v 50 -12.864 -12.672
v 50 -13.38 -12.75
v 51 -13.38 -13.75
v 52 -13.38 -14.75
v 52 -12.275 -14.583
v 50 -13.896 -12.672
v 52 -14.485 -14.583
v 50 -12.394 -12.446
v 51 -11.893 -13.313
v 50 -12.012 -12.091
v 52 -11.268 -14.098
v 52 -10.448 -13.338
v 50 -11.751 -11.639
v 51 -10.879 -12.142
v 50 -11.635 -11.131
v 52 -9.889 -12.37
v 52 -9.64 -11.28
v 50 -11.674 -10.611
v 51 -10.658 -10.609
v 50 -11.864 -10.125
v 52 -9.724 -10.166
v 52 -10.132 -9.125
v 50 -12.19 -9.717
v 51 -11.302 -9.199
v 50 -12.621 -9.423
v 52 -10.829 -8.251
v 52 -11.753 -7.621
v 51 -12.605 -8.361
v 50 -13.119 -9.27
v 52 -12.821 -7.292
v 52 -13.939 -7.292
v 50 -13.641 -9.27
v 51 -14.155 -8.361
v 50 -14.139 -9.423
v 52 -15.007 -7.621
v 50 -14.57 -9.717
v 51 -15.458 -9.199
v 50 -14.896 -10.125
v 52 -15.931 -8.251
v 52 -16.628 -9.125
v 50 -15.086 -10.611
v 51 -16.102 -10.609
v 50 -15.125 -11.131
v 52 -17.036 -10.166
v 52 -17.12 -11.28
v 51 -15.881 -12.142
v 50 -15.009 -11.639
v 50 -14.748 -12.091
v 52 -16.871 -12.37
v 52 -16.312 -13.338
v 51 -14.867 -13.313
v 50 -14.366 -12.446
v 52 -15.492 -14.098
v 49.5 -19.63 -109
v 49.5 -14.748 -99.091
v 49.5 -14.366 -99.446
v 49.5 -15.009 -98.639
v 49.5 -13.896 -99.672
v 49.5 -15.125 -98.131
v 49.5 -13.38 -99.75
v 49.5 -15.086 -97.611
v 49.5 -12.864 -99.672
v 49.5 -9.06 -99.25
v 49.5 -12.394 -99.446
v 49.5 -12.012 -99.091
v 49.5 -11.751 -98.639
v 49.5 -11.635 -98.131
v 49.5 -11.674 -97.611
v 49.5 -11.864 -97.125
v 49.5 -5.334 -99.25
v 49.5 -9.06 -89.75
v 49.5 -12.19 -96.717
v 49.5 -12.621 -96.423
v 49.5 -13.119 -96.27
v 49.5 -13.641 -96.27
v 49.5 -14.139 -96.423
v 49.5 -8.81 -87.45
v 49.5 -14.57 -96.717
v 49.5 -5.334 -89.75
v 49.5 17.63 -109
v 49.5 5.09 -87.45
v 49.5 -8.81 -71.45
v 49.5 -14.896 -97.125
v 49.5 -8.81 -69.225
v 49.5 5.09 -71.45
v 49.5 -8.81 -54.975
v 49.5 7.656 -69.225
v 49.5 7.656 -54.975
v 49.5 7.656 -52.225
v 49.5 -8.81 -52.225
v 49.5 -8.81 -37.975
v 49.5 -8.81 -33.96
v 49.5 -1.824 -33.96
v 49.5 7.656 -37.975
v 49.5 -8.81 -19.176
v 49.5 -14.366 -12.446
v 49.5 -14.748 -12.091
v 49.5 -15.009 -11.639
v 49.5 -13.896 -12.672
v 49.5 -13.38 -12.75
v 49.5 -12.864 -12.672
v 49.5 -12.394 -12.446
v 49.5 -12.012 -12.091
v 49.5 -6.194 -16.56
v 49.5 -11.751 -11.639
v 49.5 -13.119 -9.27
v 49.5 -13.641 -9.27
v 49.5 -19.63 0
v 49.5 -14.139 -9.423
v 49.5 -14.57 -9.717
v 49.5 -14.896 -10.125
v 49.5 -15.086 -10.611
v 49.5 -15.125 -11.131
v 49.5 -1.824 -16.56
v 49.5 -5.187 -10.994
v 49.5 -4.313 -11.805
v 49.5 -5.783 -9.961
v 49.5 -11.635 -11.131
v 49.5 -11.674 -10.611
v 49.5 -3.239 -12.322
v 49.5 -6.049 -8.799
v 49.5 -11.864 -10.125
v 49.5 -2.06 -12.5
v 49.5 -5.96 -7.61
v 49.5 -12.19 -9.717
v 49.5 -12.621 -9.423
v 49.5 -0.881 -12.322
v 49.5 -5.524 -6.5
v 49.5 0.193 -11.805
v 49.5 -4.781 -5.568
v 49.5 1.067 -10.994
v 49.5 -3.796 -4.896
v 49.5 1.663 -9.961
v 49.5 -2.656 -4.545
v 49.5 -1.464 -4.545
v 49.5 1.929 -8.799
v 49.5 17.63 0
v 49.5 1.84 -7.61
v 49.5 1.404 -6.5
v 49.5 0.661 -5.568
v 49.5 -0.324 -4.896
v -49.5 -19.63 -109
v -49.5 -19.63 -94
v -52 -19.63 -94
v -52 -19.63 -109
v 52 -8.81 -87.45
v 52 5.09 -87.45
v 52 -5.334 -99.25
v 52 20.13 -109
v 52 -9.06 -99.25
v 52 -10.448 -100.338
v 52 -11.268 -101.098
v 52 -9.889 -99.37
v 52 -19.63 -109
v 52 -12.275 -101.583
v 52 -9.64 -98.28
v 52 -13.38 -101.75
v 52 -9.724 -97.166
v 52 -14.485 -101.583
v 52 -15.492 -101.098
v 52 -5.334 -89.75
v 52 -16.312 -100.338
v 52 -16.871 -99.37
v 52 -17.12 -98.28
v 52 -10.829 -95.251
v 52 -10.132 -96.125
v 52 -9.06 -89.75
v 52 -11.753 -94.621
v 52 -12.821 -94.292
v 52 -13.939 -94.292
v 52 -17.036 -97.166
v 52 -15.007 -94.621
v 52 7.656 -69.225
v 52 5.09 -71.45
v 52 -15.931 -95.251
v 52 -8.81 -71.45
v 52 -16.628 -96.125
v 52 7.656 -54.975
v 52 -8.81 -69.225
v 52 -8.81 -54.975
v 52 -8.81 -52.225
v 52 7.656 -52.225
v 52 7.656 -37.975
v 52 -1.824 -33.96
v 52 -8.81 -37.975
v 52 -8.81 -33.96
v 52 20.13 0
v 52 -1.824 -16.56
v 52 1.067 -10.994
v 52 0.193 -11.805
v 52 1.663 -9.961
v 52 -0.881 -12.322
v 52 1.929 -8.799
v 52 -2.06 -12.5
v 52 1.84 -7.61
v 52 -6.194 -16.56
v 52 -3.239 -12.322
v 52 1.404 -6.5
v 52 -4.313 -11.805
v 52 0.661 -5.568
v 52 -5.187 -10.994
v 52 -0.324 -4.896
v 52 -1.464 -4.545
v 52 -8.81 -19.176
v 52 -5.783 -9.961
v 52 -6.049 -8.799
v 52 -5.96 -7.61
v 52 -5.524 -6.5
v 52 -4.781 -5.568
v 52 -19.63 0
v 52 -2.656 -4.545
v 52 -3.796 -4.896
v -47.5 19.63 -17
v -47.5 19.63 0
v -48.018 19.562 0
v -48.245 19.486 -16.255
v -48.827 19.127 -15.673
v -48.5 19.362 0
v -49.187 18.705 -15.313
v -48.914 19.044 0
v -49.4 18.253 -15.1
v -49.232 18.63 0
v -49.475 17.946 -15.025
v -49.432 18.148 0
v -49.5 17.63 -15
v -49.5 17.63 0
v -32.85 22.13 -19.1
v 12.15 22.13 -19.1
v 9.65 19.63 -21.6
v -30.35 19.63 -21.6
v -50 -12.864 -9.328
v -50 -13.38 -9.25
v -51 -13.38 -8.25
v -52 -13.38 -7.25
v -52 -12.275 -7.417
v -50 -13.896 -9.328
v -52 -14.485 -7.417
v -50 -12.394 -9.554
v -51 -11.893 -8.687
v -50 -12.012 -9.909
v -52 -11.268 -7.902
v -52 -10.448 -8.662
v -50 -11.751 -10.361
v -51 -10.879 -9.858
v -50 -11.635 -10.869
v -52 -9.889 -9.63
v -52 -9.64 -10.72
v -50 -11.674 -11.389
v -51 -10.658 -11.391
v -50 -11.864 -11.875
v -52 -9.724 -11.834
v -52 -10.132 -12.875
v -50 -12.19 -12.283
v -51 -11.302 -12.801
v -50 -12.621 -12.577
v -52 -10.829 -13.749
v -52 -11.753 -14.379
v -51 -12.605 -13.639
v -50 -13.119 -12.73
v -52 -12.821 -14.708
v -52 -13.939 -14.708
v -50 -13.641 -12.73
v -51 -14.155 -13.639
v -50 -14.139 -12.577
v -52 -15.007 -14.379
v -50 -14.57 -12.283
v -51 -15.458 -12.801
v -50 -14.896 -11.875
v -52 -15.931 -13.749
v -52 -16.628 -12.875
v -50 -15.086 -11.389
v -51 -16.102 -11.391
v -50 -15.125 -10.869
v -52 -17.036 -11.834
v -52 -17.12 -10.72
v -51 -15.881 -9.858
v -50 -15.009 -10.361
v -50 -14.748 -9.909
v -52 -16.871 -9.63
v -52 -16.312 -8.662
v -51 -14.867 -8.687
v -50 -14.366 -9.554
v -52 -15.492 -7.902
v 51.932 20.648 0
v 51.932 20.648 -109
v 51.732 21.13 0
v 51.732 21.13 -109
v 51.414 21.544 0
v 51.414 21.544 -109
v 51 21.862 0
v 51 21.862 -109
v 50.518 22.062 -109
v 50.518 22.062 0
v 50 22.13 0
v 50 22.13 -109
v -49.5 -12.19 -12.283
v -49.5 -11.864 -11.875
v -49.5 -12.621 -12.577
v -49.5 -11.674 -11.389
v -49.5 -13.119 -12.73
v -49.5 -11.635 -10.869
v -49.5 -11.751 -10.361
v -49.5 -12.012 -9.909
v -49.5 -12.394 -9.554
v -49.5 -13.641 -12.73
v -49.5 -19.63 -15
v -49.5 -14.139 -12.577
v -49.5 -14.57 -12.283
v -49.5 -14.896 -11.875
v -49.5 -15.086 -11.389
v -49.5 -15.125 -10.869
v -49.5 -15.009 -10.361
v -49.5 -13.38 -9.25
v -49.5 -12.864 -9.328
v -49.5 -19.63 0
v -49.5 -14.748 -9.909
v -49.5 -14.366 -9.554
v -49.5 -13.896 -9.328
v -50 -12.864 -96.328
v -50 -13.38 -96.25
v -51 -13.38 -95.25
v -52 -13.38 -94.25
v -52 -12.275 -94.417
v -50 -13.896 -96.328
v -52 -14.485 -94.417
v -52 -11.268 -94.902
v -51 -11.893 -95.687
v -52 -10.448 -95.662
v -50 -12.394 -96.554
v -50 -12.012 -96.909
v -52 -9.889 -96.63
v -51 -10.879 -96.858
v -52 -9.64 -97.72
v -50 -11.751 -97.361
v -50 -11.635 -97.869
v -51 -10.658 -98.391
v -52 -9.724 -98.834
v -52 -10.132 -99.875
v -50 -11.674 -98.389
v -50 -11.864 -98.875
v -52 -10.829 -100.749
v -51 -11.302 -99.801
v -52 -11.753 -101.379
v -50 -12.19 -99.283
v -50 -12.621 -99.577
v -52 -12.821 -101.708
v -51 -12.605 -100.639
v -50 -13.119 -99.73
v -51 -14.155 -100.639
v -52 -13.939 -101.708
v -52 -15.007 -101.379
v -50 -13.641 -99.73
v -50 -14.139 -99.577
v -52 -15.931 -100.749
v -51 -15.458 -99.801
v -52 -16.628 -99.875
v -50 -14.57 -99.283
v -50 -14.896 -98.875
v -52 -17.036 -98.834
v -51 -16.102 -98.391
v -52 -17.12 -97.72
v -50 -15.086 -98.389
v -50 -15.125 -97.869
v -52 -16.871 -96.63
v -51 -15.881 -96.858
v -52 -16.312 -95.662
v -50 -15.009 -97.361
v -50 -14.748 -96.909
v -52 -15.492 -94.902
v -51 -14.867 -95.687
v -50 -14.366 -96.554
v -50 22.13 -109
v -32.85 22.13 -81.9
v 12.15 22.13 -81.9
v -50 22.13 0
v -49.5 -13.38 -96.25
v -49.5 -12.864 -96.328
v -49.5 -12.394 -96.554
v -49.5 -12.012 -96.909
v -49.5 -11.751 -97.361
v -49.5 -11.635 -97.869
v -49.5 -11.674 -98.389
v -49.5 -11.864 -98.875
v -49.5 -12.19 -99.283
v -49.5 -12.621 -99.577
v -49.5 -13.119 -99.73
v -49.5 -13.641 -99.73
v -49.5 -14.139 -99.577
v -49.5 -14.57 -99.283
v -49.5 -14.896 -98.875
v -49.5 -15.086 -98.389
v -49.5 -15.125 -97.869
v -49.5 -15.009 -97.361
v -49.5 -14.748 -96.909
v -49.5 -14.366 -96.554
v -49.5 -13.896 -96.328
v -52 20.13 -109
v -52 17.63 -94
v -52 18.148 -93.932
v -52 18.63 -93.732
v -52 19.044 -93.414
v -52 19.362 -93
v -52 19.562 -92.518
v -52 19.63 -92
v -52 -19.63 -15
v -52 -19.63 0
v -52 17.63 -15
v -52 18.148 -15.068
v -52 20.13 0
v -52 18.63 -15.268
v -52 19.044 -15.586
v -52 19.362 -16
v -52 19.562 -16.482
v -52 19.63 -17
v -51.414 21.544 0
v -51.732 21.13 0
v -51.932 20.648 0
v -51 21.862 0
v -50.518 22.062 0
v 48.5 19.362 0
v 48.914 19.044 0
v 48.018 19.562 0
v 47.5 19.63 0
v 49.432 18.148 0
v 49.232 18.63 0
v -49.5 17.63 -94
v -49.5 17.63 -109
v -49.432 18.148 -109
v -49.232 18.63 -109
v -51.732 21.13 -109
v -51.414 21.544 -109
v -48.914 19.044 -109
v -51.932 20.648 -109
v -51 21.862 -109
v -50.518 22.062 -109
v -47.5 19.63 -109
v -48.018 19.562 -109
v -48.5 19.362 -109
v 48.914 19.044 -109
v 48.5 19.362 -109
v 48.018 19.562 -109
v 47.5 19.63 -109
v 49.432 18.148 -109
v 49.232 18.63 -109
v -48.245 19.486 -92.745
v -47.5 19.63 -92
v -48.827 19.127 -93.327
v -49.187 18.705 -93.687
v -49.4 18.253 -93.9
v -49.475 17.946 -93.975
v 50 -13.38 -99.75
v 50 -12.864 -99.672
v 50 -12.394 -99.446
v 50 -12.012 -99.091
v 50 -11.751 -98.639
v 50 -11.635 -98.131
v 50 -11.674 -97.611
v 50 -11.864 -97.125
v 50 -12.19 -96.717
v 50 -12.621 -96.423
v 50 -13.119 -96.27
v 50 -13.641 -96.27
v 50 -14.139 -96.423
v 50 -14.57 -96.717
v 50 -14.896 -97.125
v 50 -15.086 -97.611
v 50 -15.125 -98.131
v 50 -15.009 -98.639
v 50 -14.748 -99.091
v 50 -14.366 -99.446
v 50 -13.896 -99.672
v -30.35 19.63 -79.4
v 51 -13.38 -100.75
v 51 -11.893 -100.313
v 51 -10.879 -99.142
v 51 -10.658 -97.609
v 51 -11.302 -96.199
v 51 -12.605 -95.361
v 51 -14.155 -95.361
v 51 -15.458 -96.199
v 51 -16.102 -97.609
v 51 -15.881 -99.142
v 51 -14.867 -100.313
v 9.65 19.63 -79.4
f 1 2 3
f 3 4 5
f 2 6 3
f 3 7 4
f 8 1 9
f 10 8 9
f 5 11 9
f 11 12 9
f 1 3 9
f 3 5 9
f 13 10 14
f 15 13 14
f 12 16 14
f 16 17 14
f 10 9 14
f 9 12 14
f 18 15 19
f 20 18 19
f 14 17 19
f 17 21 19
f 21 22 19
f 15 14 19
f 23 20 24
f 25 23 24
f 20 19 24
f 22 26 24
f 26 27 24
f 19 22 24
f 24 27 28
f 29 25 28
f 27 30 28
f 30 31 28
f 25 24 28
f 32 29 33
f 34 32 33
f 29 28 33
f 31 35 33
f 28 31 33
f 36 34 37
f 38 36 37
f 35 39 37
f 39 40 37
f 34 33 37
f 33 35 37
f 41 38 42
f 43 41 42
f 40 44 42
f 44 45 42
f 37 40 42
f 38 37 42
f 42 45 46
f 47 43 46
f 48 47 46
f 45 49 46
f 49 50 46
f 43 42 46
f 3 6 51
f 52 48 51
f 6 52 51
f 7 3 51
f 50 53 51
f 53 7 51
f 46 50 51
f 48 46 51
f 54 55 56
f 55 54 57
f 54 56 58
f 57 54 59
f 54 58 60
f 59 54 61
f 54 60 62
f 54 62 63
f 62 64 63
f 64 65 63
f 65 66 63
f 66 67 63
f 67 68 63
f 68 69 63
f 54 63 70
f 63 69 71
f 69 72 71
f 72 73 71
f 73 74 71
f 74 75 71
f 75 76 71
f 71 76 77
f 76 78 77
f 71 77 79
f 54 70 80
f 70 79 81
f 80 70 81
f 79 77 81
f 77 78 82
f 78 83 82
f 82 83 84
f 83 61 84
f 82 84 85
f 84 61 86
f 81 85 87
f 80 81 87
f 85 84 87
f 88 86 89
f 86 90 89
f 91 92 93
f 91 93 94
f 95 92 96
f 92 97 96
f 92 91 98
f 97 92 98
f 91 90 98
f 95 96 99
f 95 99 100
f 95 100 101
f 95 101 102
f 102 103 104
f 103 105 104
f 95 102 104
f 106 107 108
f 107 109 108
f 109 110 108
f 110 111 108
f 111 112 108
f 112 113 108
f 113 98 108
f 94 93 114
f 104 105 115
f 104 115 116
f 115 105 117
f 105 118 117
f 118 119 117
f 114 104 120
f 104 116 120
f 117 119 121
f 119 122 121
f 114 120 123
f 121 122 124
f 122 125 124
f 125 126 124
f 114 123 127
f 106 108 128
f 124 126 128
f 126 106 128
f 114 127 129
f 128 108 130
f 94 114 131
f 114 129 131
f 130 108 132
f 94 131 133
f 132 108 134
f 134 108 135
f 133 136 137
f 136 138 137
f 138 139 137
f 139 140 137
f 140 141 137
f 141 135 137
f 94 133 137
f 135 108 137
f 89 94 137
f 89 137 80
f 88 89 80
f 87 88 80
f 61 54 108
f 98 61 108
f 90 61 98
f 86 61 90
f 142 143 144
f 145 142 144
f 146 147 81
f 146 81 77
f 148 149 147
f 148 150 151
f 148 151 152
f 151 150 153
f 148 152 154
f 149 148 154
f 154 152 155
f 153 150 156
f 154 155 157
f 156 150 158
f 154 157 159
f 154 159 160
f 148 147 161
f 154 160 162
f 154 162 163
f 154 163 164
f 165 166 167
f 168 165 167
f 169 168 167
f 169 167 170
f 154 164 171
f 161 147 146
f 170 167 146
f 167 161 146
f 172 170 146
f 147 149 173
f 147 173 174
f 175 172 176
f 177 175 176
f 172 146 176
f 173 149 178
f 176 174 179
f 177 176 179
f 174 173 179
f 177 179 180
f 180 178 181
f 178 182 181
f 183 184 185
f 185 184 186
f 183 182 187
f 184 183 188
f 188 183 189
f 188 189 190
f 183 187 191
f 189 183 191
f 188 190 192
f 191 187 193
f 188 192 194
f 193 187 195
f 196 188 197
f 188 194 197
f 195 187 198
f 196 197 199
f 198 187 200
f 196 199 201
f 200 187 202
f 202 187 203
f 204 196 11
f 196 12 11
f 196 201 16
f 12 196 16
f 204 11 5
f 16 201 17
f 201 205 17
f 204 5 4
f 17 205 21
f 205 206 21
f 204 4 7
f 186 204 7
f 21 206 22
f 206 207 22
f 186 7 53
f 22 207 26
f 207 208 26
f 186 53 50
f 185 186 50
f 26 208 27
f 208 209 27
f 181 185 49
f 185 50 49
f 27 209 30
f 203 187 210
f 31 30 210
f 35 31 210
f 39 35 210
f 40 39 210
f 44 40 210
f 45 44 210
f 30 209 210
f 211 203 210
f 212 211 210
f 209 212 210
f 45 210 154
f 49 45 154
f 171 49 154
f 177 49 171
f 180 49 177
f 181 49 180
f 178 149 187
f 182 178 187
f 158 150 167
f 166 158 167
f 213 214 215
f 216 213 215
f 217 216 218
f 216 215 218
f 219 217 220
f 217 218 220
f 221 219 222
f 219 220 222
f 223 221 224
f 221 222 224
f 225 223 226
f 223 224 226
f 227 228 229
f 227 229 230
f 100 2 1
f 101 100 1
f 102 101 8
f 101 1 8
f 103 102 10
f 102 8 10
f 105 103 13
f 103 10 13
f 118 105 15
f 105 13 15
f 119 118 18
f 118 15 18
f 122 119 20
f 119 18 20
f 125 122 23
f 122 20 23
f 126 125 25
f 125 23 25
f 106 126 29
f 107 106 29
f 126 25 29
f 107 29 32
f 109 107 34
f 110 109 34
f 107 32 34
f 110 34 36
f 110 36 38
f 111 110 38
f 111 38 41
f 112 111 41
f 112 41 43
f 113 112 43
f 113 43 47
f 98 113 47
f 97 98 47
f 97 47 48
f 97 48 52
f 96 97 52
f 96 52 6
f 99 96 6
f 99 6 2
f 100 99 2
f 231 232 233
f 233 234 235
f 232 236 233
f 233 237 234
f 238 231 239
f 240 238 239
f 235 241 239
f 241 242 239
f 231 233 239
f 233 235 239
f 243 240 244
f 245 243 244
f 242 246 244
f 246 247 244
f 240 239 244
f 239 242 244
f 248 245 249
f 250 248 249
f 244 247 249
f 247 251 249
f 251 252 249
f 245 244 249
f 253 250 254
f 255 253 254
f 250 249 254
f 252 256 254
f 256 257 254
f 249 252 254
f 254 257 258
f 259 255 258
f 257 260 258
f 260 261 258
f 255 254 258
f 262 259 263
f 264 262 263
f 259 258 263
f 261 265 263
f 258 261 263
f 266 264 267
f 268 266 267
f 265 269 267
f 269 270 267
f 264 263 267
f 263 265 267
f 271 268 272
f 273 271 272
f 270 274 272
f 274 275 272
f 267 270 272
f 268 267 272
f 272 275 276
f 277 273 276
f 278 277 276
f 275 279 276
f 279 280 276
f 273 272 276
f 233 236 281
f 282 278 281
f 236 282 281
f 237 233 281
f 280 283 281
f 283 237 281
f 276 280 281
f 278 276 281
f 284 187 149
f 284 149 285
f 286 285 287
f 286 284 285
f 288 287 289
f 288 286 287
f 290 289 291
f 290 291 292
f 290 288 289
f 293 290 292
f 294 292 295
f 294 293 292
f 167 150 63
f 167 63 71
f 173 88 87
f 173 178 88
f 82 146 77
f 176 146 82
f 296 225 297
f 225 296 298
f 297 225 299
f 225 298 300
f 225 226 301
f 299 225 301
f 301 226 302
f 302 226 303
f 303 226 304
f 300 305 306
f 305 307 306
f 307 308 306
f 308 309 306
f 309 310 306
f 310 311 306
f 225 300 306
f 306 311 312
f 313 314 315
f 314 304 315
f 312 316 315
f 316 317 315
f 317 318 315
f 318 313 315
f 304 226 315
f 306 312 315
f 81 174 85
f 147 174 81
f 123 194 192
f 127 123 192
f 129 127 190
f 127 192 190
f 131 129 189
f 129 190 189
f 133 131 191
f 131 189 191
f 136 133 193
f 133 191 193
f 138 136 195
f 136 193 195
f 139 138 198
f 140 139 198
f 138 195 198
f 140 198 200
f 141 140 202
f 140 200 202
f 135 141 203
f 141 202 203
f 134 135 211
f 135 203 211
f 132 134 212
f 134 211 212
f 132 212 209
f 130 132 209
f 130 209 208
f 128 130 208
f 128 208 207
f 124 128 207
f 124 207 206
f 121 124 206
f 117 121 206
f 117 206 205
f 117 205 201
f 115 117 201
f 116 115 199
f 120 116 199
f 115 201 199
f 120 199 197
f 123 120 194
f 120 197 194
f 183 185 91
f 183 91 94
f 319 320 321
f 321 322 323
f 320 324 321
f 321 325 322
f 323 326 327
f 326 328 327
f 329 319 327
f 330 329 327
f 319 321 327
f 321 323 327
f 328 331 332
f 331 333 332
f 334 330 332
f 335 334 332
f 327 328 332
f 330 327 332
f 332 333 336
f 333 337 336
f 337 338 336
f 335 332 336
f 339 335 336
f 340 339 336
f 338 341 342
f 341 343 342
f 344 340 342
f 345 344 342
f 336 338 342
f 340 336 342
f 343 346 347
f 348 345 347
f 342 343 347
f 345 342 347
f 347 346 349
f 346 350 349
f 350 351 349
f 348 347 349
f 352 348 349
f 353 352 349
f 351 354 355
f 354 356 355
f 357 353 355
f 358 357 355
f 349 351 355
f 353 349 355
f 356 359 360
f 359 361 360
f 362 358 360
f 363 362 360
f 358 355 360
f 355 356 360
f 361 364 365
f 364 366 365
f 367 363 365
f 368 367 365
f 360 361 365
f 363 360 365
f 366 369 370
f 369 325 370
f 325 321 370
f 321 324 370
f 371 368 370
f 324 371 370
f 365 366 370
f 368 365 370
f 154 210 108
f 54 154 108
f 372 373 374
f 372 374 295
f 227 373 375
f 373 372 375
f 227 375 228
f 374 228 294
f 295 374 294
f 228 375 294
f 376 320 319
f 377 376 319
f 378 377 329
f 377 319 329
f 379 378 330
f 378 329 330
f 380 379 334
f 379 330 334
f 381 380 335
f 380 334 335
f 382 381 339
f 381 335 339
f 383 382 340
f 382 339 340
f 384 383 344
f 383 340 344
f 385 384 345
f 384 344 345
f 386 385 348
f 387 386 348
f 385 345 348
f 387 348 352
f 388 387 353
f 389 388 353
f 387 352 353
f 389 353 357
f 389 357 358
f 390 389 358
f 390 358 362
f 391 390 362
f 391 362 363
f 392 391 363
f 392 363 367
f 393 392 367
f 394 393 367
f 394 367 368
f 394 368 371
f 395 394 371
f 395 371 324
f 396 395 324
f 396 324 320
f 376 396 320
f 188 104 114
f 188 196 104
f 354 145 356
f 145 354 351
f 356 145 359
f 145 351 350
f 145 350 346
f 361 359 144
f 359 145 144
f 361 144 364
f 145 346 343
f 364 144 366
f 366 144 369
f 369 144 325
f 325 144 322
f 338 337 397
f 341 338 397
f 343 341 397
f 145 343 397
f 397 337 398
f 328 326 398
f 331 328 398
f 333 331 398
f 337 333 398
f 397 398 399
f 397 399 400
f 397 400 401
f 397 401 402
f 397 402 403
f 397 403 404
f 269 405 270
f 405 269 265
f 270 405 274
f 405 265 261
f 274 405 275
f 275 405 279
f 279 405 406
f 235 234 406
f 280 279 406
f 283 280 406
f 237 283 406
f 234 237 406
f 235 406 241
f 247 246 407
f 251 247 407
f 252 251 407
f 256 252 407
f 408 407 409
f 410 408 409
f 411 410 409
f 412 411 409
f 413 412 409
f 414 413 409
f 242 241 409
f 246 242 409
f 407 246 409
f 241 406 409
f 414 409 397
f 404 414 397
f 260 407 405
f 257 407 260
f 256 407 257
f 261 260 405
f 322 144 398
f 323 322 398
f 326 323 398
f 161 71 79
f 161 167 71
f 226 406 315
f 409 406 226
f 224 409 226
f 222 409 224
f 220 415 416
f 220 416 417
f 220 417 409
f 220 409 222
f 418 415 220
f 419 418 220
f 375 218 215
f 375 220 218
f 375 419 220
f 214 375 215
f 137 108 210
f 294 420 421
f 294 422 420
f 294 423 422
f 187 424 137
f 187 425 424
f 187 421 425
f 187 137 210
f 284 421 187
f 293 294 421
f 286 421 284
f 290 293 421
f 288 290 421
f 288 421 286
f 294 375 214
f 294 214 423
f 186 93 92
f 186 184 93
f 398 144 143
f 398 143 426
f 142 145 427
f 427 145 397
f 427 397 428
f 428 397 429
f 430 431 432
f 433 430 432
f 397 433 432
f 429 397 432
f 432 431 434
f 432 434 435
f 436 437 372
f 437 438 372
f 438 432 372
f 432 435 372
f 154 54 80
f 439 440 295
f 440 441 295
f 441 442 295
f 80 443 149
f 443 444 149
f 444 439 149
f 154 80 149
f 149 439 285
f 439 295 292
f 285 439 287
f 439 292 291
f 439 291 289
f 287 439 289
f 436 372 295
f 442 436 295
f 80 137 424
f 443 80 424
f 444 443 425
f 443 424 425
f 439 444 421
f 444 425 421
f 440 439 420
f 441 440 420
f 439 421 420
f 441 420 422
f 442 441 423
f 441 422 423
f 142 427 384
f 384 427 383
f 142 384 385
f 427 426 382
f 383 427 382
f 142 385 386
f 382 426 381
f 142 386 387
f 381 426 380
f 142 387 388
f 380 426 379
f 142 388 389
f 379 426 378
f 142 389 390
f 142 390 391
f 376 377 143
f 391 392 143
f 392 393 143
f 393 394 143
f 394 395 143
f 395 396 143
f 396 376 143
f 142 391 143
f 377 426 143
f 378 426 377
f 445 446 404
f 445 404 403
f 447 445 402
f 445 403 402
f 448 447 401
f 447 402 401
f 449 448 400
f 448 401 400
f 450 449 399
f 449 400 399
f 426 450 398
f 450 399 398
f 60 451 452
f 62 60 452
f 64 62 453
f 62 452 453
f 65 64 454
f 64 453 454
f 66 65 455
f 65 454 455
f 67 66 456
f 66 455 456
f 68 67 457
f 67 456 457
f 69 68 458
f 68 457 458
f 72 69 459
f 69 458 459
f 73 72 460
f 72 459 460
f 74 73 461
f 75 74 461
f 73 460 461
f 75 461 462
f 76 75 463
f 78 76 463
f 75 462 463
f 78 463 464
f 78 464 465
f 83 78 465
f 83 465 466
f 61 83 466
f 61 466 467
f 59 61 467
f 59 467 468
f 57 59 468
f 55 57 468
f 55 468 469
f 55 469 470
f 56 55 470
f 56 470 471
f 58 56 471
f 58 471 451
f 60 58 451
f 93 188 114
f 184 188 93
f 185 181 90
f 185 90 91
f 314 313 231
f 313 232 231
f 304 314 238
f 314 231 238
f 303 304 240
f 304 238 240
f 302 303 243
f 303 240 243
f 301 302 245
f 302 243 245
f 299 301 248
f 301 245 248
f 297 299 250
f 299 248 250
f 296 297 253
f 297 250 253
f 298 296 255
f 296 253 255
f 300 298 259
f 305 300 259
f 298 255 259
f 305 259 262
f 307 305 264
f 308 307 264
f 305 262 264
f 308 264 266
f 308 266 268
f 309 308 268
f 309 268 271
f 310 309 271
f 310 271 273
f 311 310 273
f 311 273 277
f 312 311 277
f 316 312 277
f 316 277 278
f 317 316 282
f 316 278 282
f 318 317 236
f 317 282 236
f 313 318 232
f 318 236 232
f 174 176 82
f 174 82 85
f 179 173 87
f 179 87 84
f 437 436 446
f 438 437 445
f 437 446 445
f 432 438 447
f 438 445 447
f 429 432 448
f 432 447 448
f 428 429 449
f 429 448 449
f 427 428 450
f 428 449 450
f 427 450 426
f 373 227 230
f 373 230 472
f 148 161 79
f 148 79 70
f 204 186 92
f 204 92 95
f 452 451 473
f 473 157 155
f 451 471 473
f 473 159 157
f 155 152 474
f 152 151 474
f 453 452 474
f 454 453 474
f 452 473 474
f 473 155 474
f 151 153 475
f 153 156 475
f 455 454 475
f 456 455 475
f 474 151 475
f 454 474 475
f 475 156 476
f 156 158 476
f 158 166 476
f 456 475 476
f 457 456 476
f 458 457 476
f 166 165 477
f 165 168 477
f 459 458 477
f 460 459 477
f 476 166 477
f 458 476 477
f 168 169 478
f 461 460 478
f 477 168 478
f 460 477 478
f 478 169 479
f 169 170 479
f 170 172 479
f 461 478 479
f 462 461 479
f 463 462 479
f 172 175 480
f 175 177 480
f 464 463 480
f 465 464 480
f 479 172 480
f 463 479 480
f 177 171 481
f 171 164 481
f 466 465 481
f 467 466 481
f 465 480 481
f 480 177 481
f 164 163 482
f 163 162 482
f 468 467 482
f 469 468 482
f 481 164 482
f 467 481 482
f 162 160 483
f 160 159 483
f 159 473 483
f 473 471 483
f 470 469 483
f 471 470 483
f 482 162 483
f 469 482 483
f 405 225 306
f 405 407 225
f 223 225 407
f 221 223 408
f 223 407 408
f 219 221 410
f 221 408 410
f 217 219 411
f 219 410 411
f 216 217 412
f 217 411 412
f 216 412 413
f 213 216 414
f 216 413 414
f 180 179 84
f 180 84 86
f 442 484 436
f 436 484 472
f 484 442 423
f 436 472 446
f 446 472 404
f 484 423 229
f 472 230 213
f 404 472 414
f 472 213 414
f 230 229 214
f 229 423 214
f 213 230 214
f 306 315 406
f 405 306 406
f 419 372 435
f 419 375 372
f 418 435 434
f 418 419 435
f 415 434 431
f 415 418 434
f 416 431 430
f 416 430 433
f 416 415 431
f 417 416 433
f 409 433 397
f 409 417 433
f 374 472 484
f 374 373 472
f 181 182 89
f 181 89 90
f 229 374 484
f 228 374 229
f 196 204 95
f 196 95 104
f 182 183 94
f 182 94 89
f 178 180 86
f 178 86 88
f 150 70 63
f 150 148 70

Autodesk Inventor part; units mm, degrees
ref_plane "YZ Plane" through (0, 0, 0) normal (1, 0, 0) x (0, 1, 0)
sketch "Sketch1" plane through (0, 0, 0) normal (0, 0, 1) x (1, 0, 0)
  line L0 (47.5, 19.63) -> (-47.5, 19.63) projected
  arc A0 (-47.5, 19.63) -> (-49.5, 17.63) centre (-47.5, 17.63) ccw projected
  line L1 (-49.5, 17.63) -> (-49.5, -19.63) projected
  line L2 (49.5, -19.63) -> (49.5, 17.63) projected
  arc A1 (49.5, 17.63) -> (47.5, 19.63) centre (47.5, 17.63) ccw projected
  line L3 (-49.5, -19.63) -> (-52, -19.63)
  line L4 (-52, -19.63) -> (-52, 20.13)
  line L5 (-50, 22.13) -> (50, 22.13)
  line L6 (52, 20.13) -> (52, -19.63)
  line L7 (52, -19.63) -> (49.5, -19.63)
  arc A2 (-50, 22.13) -> (-52, 20.13) centre (-50, 20.13) ccw
  arc A3 (52, 20.13) -> (50, 22.13) centre (50, 20.13) ccw
  dimension "d0" = 2.5
  dimension "d1" = 2.5
  dimension "d2" = 2.5
  dimension "d3" = 2
ref_plane "Work Plane1" through (-49.5, -19.63, -109) normal (0, 0, -1) x (0, 1, 0)
extrude "Extrusion1" add sketch "Sketch1" against normal up to surface (109 mm away)
sketch "Sketch2" plane through (-50, 22.13, 0) normal (0, 1, 0) x (1, 0, 0)
  circle A0 centre (39.65, 50.5) radius 18.5 construction
  line L0 (58.85, 79.4) -> (20.45, 79.4) construction
  line L1 (20.45, 79.4) -> (20.45, 21.6) construction
  line L2 (58.85, 21.6) -> (58.85, 79.4) construction
  line L3 (20.45, 21.6) -> (58.85, 21.6) construction
  line L4 (20.15, 23.6) -> (20.15, 77.4) construction
  line L5 (59.15, 77.4) -> (59.15, 23.6) construction
  line L6 (20.15, 21.6) -> (59.15, 21.6) construction
  line L7 (59.15, 79.4) -> (20.15, 79.4) construction
  line L8 (20.15, 21.6) -> (59.15, 21.6)
  line L9 (59.15, 21.6) -> (59.15, 79.4)
  line L10 (59.15, 79.4) -> (20.15, 79.4)
  line L11 (20.15, 79.4) -> (20.15, 21.6)
  line L12 (59.65, 79.4) -> (19.65, 79.4)
  line L13 (19.65, 79.4) -> (19.65, 21.6)
  line L14 (19.65, 21.6) -> (59.65, 21.6)
  line L15 (59.65, 21.6) -> (59.65, 79.4)
  point P0 (50, 0)
  point P1 (59.65, 50.5)
  point P2 (59.15, 79.4)
  dimension "d43" = 40
  dimension "d44" = 39
  dimension "d45" = 0.5
extrude "Extrusion2" cut sketch "Sketch2" against normal up to surface (2.5 mm away)
chamfer "Chamfer1" distance 2.5 angle 45 4 edges at (-10.35, 22.13, -79.4) (-30.35, 22.13, -50.5) (9.65, 22.13, -50.5) (-10.35, 22.13, -21.6)
sketch "Sketch3" plane through (-52, -19.63, 0) normal (-1, 0, 0) x (0, 0, 1)
  line L0 (-94, 9.5) -> (-94, 37.26) projected
  arc A0 (-92, 39.26) -> (-94, 37.26) centre (-92, 37.26) ccw projected
  line L1 (-92, 39.26) -> (-17, 39.26) projected
  arc A1 (-15, 37.26) -> (-17, 39.26) centre (-17, 37.26) ccw projected
  line L2 (-15, 37.26) -> (-15, 9.5) projected
  line L3 (-94, 9.5) -> (-94, 0)
  line L4 (0, 0) -> (-109, 0) construction
  line L5 (-15, 9.5) -> (-15, 0)
  line L6 (-94, 0) -> (-15, 0)
  circle A2 centre (-98, 6.25) radius 1.5 construction
  circle A3 centre (-11, 6.25) radius 1.5 construction
  circle A4 centre (-98, 6.25) radius 1.75
  circle A5 centre (-11, 6.25) radius 1.75
  point P0 (0, 19.63)
  dimension "d13" = 3.5
  dimension "d14" = 3.5
ref_plane "Work Plane2" through (-47.0185, 3.2145, -3.5) normal (1, 0, 0) x (0, 1, 0)
extrude "Extrusion3" cut sketch "Sketch3" against normal up to surface (4.9815 mm away)
sketch "Sketch4" plane through (52, -19.63, 0) normal (1, 0, 0) x (0, 0, -1)
  circle A0 centre (98, 6.25) radius 1.5 construction
  circle A1 centre (11, 6.25) radius 1.5 construction
  arc A2 (72.9, 14.47) -> (72.9168, 14.38) centre (73.1508, 14.4702) ccw construction
  line L0 (72.9, 16.76) -> (72.9, 14.47) construction
  line L1 (72.9, 16.76) -> (72.9, 18.76) construction
  line L2 (72.9, 22.14) -> (72.9, 18.76) construction
  arc A3 (73.15, 22.39) -> (72.9, 22.14) centre (73.15, 22.14) ccw construction
  line L3 (73.15, 22.39) -> (85.55, 22.39) construction
  arc A4 (85.8, 22.14) -> (85.55, 22.39) centre (85.55, 22.14) ccw construction
  line L4 (85.8, 22.14) -> (85.8, 18.76) construction
  line L5 (85.8, 18.76) -> (85.8, 16.76) construction
  line L6 (85.8, 16.76) -> (85.8, 14.47) construction
  arc A5 (85.7832, 14.38) -> (85.8, 14.47) centre (85.5492, 14.4702) ccw construction
  line L7 (85.7832, 14.38) -> (86.5, 14.38) construction
  line L8 (86.5, 14.38) -> (86.5, 12.03) construction
  line L9 (81.88, 12.03) -> (86.5, 12.03) construction
  line L10 (81.88, 12.03) -> (81.88, 11.42) construction
  line L11 (81.88, 11.42) -> (86.45, 11.42) construction
  line L12 (87.2, 11.42) -> (86.45, 11.42) construction
  line L13 (87.2, 24.47) -> (87.2, 11.42) construction
  line L14 (87.2, 24.52) -> (87.2, 24.47) construction
  line L15 (87.2, 24.52) -> (71.7, 24.52) construction
  line L16 (71.7, 24.52) -> (71.7, 24.47) construction
  line L17 (71.7, 24.47) -> (71.7, 11.42) construction
  line L18 (71.7, 11.42) -> (72.45, 11.42) construction
  line L19 (72.45, 11.42) -> (76.82, 11.42) construction
  line L20 (76.82, 12.03) -> (76.82, 11.42) construction
  line L21 (72.3, 12.03) -> (76.82, 12.03) construction
  line L22 (72.3, 14.38) -> (72.3, 12.03) construction
  line L23 (72.3, 14.38) -> (72.9168, 14.38) construction
  line L24 (68.675, 20.9412) -> (68.975, 20.9412) construction
  line L25 (68.975, 20.9412) -> (68.975, 26.4362) construction
  arc A6 (68.975, 26.4362) -> (68.375, 27.0362) centre (68.375, 26.4362) ccw construction
  line L26 (68.375, 27.0362) -> (55.825, 27.0362) construction
  arc A7 (55.825, 27.0362) -> (55.225, 26.4362) centre (55.825, 26.4362) ccw construction
  line L27 (55.225, 26.4362) -> (55.225, 20.9412) construction
  line L28 (55.225, 20.9412) -> (55.525, 20.9412) construction
  line L29 (55.525, 26.4362) -> (55.525, 20.9412) construction
  arc A8 (55.825, 26.7362) -> (55.525, 26.4362) centre (55.825, 26.4362) ccw construction
  line L30 (68.375, 26.7362) -> (55.825, 26.7362) construction
  arc A9 (68.675, 26.4362) -> (68.375, 26.7362) centre (68.375, 26.4362) ccw construction
  line L31 (68.675, 26.4362) -> (68.675, 20.9412) construction
  line L32 (51.675, 20.9412) -> (51.975, 20.9412) construction
  line L33 (51.975, 20.9412) -> (51.975, 26.4362) construction
  arc A10 (51.975, 26.4362) -> (51.375, 27.0362) centre (51.375, 26.4362) ccw construction
  line L34 (51.375, 27.0362) -> (38.825, 27.0362) construction
  arc A11 (38.825, 27.0362) -> (38.225, 26.4362) centre (38.825, 26.4362) ccw construction
  line L35 (38.225, 26.4362) -> (38.225, 20.9412) construction
  line L36 (38.225, 20.9412) -> (38.525, 20.9412) construction
  line L37 (38.525, 26.4362) -> (38.525, 20.9412) construction
  arc A12 (38.825, 26.7362) -> (38.525, 26.4362) centre (38.825, 26.4362) ccw construction
  line L38 (51.375, 26.7362) -> (38.825, 26.7362) construction
  arc A13 (51.675, 26.4362) -> (51.375, 26.7362) centre (51.375, 26.4362) ccw construction
  line L39 (51.675, 26.4362) -> (51.675, 20.9412) construction
  line L40 (3.1, 11.07) -> (101.9, 11.07) construction
  circle A14 centre (8.5, 17.57) radius 4
  circle A15 centre (11, 6.25) radius 1.75
  circle A16 centre (98, 6.25) radius 1.75
  line L41 (37.975, 27.2862) -> (52.225, 27.2862)
  line L42 (52.225, 27.2862) -> (52.225, 10.82)
  line L43 (52.225, 10.82) -> (37.975, 10.82)
  line L44 (37.975, 10.82) -> (37.975, 27.2862)
  line L45 (54.975, 27.2862) -> (69.225, 27.2862)
  line L46 (69.225, 27.2862) -> (69.225, 10.82)
  line L47 (69.225, 10.82) -> (54.975, 10.82)
  line L48 (54.975, 10.82) -> (54.975, 27.2862)
  line L49 (71.45, 24.72) -> (87.45, 24.72)
  line L50 (87.45, 24.72) -> (87.45, 10.82)
  line L51 (87.45, 10.82) -> (71.45, 10.82)
  line L52 (71.45, 10.82) -> (71.45, 24.72)
  line L53 (90.5, 13.2962) -> (90.5, 12.7462) construction
  line L54 (91.35, 13.7962) -> (91, 13.7962) construction
  line L55 (98, 13.7962) -> (97.6, 13.7962) construction
  line L56 (98.5, 13.2962) -> (98.5, 12.7462) construction
  line L57 (89.75, 14.2962) -> (99.25, 14.2962)
  line L58 (99.25, 14.2962) -> (99.25, 10.57)
  line L59 (99.25, 10.57) -> (89.75, 10.57)
  line L60 (89.75, 10.57) -> (89.75, 14.2962)
  line L61 (71.7, 24.47) -> (87.2, 24.47) construction
  line L62 (87.2, 24.47) -> (87.2, 11.07) construction
  line L63 (87.2, 11.07) -> (71.7, 11.07) construction
  line L64 (71.7, 11.07) -> (71.7, 24.47) construction
  circle A17 centre (8.5, 17.57) radius 3.2 projected
  line L65 (19.46, 17.8062) -> (32.46, 17.8062) construction
  line L66 (16.81, 16.0562) -> (16.81, 16.7062) construction
  line L67 (33.71, 16.5312) -> (33.71, 12.5212) construction
  line L68 (18.4564, 11.8926) -> (16.9564, 13.3926) construction
  line L69 (16.56, 17.8062) -> (33.96, 17.8062)
  line L70 (33.96, 17.8062) -> (33.96, 10.82)
  line L71 (33.96, 10.82) -> (19.1755, 10.82)
  line L72 (19.1755, 10.82) -> (16.56, 13.4355)
  line L73 (16.56, 13.4355) -> (16.56, 17.8062)
  point P0 (0, 19.63)
  point P1 (17.8, 27.1262)
  point P2 (68.975, 23.6887)
  point P3 (91.175, 13.7962)
  point P4 (90.5, 13.0212)
  point P5 (98.5, 13.0212)
  point P6 (16.81, 16.3812)
  dimension "d15" = 8
  dimension "d16" = 3.5
  dimension "d17" = 3.5
  dimension "d23" = 0.25
  dimension "d24" = 0.25
  dimension "d25" = 0.25
  dimension "d26" = 0.25
  dimension "d27" = 0.25
  dimension "d28" = 0.25
  dimension "d29" = 0.25
  dimension "d30" = 0.25
  dimension "d31" = 0.25
  dimension "d32" = 0.25
  dimension "d33" = 0.25
  dimension "d34" = 0.5
  dimension "d35" = 0.5
  dimension "d36" = 0.75
  dimension "d37" = 0.75
  dimension "d46" = 0.25
  dimension "d47" = 0.25
  dimension "d49" = 0.25
  dimension "d50" = 0.25
  dimension "d51" = 0.25
  dimension "d52" = 0
extrude "Extrusion4" cut sketch "Sketch4" against normal up to surface (2.5 mm away) contours A14 | A15 | A16 | L41 L42 L43 L44 | L45 L46 L47 L48 | L49 L50 L51 L52 | L57 L58 L59 L60 | A17 | L69 L70 L71 L72 L73
chamfer "Chamfer2" distance 2 angle 45 4 edges at (52, -13.38, -9.25) (52, -13.38, -96.25) (-52, -13.38, -99.75) (-52, -13.38, -12.75)
equation "\"d1\" = d0"
equation "\"d2\" = d0"
equation "\"d45\" = -0.5 * d44 + 0.5 * d43"
equation "\"d14\" = d13"
equation "\"d17\" = d16"
equation "\"d23\" = d20"
equation "\"d24\" = d23"
equation "\"d25\" = d24"
equation "\"d26\" = d24"
equation "\"d27\" = d26"
equation "\"d28\" = d26"
equation "\"d29\" = d25"
equation "\"d30\" = d29"
equation "\"d31\" = d27"
equation "\"d32\" = d31"
equation "\"d33\" = d31"
equation "\"d34\" = d35"
equation "\"d37\" = d36"
equation "\"d20\" = d18"
equation "\"d18\" = 0.25"
properties part number "Shroud Top"
